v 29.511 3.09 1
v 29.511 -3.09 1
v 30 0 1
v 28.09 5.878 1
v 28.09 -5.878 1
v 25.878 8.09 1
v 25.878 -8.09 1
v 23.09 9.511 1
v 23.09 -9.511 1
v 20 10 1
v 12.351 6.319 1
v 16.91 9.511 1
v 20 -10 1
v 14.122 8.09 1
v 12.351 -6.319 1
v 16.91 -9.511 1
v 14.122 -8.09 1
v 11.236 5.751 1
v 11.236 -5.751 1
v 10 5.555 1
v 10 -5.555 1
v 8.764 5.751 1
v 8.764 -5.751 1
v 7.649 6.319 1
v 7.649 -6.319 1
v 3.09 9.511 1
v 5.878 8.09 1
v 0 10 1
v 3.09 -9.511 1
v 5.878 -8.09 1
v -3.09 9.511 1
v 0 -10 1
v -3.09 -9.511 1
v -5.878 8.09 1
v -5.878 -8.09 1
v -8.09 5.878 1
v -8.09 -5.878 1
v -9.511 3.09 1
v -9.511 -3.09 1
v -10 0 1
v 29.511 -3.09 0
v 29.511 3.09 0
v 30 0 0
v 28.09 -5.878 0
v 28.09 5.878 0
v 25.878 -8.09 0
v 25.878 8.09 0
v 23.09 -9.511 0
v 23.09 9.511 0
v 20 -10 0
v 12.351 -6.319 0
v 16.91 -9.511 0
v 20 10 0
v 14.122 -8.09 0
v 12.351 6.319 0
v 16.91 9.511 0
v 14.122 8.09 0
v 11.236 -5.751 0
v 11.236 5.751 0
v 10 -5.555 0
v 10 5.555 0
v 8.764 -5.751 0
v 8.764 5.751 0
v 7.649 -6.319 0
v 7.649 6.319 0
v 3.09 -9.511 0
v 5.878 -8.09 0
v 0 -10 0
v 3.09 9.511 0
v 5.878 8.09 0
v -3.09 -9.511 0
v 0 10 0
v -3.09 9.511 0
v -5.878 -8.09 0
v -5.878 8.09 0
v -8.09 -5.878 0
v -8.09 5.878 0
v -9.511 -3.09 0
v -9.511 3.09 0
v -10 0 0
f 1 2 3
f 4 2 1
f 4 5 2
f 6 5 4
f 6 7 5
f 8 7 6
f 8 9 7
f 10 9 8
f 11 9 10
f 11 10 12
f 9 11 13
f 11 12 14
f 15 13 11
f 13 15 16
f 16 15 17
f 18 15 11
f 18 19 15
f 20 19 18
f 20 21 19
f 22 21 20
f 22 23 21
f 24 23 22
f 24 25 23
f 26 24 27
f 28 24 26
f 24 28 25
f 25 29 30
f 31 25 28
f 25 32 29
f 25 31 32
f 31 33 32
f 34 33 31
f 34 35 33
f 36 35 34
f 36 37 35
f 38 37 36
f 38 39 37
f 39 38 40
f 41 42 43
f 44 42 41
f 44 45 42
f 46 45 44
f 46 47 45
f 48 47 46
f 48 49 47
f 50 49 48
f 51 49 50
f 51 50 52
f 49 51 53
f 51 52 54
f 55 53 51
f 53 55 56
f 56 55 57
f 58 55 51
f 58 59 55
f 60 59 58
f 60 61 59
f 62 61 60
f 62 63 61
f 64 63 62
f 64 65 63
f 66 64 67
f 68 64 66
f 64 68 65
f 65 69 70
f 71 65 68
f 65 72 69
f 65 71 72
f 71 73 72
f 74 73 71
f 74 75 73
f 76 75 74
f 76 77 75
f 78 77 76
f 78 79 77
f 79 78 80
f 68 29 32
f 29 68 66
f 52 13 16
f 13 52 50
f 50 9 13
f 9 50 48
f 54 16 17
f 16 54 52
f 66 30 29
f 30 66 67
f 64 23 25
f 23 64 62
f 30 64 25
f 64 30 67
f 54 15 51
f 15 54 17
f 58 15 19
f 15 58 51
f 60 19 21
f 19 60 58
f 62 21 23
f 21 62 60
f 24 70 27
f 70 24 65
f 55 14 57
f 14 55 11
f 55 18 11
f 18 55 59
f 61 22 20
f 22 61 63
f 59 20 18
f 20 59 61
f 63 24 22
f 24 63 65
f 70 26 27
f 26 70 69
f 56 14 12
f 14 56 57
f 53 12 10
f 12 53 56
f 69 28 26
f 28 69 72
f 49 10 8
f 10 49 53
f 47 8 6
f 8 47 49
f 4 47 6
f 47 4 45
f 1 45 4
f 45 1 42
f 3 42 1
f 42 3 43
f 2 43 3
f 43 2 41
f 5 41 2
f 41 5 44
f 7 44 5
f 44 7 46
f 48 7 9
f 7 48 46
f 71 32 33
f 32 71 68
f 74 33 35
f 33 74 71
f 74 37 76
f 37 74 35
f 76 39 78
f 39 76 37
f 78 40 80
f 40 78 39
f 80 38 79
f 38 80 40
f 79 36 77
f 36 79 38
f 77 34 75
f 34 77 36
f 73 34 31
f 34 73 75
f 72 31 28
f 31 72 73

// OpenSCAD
// file: chamferer.scad
INFINITY = 10000;
ATOM = .01;

module chamfer_tool(r, fn, tool,
                    ax, ay, az,
                    ax2, ay2, az2,
                    ax3, ay3, az3) {
    rotate([ax3, ay3, az3])
    rotate([ax2, ay2, az2])
    rotate([ax, ay, az]) {
        if (tool=="sphere") {
            sphere(r, $fn=fn);
        }
        else if (tool=="hemisphere-up") {
            intersection() {
                sphere(r, $fn=fn);
                cylinder(r=r*2, h=r*2);
            }
        }
        else if (tool=="hemisphere-down") {
            difference() {
                sphere(r, $fn=fn);
                cylinder(r=r*2, h=r*2);
            }
        }
        else if (tool=="cone") {
            cylinder(r, r, 0, $fn=fn);
            scale([1, 1, -1])
            cylinder(r, r, 0, $fn=fn);
        }
        else if (tool=="cone-up") {
            cylinder(r, r, 0, $fn=fn, center=true);
        }
        else if (tool=="cone-down") {
            scale([1, 1, -1])
            cylinder(r, r, 0, $fn=fn, center=true);
        }
        else if (tool=="octahedron") {
            resize([r*2, r*2, r*2]) {
                cylinder(r, r, 0, $fn=4);
                scale([1, 1, -1])
                cylinder(r, r, 0, $fn=4);
            }
        }
        else if (tool=="pyramid") {
            resize([r*2, r*2, r*2]) {
                cylinder(r, r, 0, center=true, $fn=4);
            }
        }
        else if (tool=="rpyramid") {
            resize([r*2, r*2, r*2]) {
                cylinder(r, 0, r, center=true, $fn=4);
            }
        }
        else if (tool=="cylinder-z" || tool=="cylinder") {
            cylinder(r=r, h=ATOM, $fn=fn, center=true);
        }
        else if (tool=="cylinder-x") {
            rotate([0, 90, 0])
            cylinder(r=r, h=ATOM, $fn=fn, center=true);
        }
        else if (tool=="cylinder-y") {
            rotate([90, 0, 0])
            cylinder(r=r, h=ATOM, $fn=fn, center=true);
        }
        else if (tool=="cube") {
            cube(r*2, center=true);
        }
        else if (tool=="plate-y") {
            cube([r*2, ATOM, r*2], center=true);
        }
        else {
            assert(false, str("Unknown tool: ", tool));
        }
    }
}

module shrinker(r, tool, fn,
                ax, ay, az,
                ax2, ay2, az2,
                ax3, ay3, az3) {
    if (!r) {
        children();
    }
    else {
        // re-invert+grow = fillet
        difference() {
            cube(INFINITY/2, center=true);

            // invert+grow = carve
            minkowski() {
                difference() {
                    cube(INFINITY, center=true);
                    children();
                }
                //cube(r, center=true);
                chamfer_tool(r, fn, tool,
                             ax, ay, az,
                             ax2, ay2, az2,
                             ax3, ay3, az3);
            }
        }
    }
}

module chamferer(r, tool="sphere", fn=8, shrink=true, grow=true,
                 ax=0, ay=0, az=0,
                 ax2=0, ay2=0, az2=0,
                 ax3=0, ay3=0, az3=0,
) {
    if (!r) {
        children();
    }
    else {
        minkowski() {
            if (shrink)
                shrinker(r, tool, fn,
                         ax, ay, az,
                         ax2, ay2, az2,
                         ax3, ay3, az3) children();
            else
                children();
            
            if (grow)
                chamfer_tool(r, fn, tool,
                             ax, ay, az,
                             ax2, ay2, az2,
                             ax3, ay3, az3);
        }
    }
}



cube(50);

translate([70, 0, 0])
chamferer(5, "hemisphere-up", $preview? 6*4 : 30)
//shrinker(5, "sphere", $preview? 6*4 : 30)
cube(50);

translate([70*2, 0, 0])
chamferer(5, "octahedron", grow=false)
cube(50);
// main file
use <chamferer.scad>

ATOM = .01;

$fn = 20;

sm = 4; // Smoothness. Small: tight, big: hull

chamferer(sm, "cylinder", fn=$fn, grow=false)
chamferer(sm, "cylinder", fn=$fn, shrink=false)
union() {
    cylinder(d=20, h=1);
    %cylinder(d=20, h=2);

    translate([20, 0, 0])
    cylinder(d=20, h=1);

    %translate([20, 0, 0])
    cylinder(d=20, h=2);
}
